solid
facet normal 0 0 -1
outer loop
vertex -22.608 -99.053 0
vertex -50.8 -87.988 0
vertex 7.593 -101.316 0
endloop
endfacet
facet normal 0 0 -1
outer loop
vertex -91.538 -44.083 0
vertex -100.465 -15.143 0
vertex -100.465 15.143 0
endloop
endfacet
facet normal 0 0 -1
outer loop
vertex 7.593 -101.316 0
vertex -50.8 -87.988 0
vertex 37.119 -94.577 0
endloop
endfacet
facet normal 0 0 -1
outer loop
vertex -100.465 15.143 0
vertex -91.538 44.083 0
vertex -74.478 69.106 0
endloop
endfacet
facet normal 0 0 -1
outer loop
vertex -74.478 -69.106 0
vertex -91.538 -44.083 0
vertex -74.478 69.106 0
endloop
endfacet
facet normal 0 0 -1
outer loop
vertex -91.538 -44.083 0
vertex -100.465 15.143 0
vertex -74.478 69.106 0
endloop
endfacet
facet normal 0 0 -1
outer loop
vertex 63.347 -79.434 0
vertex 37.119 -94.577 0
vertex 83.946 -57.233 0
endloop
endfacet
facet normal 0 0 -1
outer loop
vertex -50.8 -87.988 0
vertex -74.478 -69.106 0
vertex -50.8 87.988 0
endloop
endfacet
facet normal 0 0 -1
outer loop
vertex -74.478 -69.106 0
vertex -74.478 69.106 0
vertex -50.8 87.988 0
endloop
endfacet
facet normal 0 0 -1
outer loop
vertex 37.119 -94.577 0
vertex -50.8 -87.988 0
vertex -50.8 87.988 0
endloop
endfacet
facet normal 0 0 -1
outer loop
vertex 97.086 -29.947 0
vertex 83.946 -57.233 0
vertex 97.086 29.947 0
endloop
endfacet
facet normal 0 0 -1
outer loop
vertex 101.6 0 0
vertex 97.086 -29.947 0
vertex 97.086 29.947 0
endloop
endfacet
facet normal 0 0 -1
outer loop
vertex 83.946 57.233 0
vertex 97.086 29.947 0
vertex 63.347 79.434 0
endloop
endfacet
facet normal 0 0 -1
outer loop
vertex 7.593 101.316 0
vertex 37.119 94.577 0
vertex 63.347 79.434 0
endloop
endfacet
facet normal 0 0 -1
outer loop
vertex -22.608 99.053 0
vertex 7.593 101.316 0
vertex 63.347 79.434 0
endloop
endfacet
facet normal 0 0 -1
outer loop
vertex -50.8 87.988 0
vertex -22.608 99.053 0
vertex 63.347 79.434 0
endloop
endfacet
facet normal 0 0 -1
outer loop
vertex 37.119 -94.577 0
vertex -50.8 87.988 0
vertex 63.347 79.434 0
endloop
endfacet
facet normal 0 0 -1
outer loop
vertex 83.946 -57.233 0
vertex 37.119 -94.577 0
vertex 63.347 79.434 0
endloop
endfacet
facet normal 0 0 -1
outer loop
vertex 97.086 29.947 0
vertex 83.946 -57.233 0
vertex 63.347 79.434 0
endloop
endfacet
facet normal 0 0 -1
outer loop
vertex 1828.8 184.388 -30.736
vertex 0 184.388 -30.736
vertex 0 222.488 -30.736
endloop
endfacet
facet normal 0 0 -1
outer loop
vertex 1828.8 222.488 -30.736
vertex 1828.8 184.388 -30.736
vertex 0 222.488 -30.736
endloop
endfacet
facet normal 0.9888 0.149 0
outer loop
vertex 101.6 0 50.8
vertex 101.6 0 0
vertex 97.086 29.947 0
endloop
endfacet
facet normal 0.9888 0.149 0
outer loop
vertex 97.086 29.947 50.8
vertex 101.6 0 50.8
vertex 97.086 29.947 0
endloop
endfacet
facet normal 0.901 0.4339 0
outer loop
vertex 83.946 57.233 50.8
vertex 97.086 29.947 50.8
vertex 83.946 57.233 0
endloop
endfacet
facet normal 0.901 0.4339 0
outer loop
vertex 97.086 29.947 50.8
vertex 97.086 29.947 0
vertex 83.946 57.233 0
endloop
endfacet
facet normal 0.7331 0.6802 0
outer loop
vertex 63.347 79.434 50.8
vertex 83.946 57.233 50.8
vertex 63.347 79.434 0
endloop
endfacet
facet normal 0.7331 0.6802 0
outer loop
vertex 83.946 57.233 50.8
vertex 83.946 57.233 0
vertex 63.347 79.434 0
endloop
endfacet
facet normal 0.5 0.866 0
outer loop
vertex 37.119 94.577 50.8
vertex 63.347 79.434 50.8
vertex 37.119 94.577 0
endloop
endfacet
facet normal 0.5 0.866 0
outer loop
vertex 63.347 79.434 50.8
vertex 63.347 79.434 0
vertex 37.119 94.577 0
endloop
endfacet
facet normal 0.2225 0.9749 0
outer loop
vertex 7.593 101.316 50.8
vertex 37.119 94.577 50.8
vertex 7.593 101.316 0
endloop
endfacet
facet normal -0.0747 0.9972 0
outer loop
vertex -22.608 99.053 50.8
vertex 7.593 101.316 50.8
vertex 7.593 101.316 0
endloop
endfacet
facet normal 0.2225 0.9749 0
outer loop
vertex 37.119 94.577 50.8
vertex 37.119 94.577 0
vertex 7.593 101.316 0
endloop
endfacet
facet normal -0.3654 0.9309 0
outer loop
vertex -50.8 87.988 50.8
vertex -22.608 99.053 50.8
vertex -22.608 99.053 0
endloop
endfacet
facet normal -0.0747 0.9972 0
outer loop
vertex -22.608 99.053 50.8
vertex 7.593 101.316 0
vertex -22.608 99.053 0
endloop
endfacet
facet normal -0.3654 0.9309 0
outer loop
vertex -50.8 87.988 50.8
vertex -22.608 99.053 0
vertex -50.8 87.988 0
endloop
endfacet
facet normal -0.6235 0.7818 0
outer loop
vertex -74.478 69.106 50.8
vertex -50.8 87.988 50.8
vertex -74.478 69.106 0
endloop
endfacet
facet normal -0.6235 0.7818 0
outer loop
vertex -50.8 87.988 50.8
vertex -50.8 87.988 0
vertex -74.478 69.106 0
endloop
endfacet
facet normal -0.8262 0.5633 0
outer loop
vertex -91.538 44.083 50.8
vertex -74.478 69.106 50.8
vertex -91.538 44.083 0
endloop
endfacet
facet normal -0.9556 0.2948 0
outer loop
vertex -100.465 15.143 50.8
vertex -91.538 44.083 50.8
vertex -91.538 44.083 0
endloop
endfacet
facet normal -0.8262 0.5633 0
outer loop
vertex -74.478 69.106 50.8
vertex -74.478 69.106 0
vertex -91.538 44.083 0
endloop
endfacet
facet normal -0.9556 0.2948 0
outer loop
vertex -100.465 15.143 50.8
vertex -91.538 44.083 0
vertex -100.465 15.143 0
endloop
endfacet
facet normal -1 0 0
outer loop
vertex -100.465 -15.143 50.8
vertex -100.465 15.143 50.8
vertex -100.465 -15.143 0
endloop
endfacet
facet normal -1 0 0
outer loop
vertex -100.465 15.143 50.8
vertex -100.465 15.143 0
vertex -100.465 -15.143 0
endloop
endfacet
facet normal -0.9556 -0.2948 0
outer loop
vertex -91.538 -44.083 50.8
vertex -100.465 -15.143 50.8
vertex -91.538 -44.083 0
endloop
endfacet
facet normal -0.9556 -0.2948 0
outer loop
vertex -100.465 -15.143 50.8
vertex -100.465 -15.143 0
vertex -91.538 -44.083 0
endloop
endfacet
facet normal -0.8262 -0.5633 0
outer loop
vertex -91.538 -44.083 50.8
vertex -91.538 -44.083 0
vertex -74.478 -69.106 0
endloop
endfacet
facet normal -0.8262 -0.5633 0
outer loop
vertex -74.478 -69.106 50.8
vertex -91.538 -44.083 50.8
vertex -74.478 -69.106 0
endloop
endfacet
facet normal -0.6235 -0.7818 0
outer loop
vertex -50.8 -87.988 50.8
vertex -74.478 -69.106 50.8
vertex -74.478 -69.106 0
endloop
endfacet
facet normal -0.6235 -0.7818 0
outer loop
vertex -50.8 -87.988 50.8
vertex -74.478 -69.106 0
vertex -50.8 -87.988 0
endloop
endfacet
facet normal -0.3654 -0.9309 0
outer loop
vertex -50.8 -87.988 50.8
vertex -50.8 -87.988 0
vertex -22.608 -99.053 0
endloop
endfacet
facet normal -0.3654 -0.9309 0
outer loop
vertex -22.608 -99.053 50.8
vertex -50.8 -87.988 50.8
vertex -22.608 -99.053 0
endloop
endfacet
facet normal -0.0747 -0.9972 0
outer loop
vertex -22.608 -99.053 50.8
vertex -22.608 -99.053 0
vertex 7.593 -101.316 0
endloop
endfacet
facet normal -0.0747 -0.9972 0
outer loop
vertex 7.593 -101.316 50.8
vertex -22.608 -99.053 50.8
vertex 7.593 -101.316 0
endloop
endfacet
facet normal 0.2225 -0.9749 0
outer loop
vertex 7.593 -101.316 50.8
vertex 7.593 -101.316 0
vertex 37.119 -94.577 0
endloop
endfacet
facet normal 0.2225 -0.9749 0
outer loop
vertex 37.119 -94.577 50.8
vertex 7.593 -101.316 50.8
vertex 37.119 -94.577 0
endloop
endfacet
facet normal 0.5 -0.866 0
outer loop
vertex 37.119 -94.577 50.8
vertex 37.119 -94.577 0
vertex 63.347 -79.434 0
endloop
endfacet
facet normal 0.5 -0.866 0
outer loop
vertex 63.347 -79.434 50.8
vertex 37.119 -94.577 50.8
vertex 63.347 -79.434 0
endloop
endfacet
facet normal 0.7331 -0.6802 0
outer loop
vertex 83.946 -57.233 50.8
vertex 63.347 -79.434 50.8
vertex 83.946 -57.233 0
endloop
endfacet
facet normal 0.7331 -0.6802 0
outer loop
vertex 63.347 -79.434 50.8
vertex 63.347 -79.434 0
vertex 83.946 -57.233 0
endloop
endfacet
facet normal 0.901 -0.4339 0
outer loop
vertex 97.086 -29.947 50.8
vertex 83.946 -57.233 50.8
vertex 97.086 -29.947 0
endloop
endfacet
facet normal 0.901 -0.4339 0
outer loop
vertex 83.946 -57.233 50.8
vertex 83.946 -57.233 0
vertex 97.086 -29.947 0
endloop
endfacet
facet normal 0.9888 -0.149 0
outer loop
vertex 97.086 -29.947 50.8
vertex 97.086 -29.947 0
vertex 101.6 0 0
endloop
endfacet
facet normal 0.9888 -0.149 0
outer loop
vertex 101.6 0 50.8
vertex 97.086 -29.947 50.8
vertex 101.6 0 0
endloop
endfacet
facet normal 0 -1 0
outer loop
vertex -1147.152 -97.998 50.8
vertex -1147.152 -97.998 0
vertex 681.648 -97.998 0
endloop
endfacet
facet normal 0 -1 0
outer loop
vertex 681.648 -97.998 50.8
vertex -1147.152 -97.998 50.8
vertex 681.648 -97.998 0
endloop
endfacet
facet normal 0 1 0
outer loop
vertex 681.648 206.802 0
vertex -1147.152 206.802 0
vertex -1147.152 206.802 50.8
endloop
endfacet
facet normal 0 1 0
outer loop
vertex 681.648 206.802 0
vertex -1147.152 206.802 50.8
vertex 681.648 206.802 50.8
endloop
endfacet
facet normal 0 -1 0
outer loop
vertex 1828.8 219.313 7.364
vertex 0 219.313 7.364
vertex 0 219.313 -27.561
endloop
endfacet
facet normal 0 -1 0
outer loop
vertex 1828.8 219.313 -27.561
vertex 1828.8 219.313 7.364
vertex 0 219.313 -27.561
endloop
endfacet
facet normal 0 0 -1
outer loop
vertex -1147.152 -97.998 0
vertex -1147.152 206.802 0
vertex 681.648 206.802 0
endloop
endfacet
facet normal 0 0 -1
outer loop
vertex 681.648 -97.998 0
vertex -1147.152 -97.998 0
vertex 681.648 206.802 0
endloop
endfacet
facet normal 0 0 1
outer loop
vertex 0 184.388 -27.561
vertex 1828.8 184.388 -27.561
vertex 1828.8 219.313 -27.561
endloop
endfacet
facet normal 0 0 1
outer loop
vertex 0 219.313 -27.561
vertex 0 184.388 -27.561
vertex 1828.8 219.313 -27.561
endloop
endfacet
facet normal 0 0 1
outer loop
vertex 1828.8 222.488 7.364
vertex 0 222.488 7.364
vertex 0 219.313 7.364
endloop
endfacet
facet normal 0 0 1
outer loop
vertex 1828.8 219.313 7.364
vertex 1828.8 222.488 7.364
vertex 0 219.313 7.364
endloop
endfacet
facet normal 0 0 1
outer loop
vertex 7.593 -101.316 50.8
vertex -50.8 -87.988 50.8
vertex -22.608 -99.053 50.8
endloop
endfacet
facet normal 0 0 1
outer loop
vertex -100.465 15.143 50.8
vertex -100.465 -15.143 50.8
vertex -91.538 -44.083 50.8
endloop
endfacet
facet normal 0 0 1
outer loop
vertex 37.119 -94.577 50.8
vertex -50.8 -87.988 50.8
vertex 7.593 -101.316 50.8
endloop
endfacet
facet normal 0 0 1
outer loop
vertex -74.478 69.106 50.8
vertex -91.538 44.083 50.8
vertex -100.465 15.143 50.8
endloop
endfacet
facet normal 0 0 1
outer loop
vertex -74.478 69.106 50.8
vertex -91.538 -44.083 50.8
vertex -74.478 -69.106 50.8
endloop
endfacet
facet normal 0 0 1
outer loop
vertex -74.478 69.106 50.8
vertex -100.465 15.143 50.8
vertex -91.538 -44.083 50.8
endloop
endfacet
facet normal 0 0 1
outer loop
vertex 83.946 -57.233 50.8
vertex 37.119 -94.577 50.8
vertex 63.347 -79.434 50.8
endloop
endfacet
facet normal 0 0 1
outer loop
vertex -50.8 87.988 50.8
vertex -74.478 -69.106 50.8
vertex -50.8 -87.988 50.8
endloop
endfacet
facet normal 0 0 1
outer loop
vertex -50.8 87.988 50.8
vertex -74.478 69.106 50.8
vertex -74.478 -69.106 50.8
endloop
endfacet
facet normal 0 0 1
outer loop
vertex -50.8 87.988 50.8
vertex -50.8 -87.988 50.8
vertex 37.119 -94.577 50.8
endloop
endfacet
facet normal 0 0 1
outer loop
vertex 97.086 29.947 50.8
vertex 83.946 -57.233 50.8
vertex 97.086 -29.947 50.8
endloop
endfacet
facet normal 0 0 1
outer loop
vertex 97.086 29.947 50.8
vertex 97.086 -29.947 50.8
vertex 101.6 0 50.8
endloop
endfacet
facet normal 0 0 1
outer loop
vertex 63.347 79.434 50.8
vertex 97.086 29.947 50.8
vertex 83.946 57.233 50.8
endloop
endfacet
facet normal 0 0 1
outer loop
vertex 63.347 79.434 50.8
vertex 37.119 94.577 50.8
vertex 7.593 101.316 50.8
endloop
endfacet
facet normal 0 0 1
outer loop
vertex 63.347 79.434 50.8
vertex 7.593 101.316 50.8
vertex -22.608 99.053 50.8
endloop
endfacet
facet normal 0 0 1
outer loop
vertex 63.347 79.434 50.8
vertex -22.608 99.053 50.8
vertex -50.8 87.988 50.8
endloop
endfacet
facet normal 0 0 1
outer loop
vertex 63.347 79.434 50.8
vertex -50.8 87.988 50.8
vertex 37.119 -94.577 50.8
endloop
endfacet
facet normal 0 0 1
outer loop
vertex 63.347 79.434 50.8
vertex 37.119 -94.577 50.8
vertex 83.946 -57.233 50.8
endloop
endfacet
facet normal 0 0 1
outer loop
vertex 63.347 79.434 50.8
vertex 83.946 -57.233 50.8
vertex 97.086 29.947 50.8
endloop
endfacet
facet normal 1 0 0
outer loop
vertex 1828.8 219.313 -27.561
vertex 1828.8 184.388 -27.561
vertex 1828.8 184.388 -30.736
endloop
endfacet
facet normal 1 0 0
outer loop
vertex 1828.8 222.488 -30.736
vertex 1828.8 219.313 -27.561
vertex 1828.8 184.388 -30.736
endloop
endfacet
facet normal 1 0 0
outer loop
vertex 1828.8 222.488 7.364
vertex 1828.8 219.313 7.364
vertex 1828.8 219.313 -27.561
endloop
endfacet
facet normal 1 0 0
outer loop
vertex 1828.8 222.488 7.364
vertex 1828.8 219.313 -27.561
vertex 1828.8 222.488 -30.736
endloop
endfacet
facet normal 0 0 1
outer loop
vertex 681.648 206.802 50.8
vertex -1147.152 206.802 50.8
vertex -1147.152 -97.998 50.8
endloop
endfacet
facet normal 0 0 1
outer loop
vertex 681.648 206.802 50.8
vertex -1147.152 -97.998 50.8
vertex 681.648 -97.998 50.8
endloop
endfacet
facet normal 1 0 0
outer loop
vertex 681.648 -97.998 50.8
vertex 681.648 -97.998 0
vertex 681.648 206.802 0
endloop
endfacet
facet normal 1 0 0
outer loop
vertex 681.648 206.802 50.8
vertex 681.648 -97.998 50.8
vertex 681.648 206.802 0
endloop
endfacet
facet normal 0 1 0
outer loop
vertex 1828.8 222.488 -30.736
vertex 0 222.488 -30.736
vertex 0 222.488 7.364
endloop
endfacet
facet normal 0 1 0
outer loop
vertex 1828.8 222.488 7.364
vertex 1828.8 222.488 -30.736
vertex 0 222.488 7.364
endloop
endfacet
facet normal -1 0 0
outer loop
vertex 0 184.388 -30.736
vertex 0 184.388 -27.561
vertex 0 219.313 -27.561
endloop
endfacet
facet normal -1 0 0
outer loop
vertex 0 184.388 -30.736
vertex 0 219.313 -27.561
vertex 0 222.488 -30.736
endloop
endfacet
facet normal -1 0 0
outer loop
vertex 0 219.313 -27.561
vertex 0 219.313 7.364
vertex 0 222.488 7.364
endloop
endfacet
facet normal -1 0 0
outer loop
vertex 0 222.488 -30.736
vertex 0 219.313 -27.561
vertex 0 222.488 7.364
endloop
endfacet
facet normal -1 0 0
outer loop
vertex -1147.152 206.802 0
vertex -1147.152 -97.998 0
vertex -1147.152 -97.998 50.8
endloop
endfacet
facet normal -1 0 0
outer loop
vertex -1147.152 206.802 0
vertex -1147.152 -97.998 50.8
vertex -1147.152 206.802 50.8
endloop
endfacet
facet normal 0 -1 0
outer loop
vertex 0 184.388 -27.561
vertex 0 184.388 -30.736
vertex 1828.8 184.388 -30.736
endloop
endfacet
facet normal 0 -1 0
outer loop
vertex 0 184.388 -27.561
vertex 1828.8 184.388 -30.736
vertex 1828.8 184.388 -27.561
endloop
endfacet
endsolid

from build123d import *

# Parameters (mm, degrees)
F0_R     = 101.6
F1_DEPTH = 50.8
F2_W     = 1828.8
F2_H     = 304.8
F3_DEPTH = 50.8
F4_W     = 34.925
F4_H     = 3.175
F5_DEPTH = 1828.8


with BuildPart() as f1:
    # F0 (on Top) → F1 (new body)
    with BuildSketch(Plane.XY):
        Circle(F0_R)
    extrude(amount=F1_DEPTH)


with BuildPart() as f3:
    # F2 (on Top) → F3 (new body)
    with BuildSketch(Plane.XY):
        with Locations((-232.752066, 54.402089)):
            Rectangle(F2_W, F2_H)
    extrude(amount=F3_DEPTH)


with BuildPart() as f5:
    # F4 (on Right) → F5 (new body)
    with BuildSketch(Plane.YZ):
        Polygon((222.487578, -30.73646), (222.487578, 7.36354), (219.312578, 7.36354), (219.312578, -27.56146), (219.312578, -30.73646), align=None)
        with Locations((201.850078, -29.14896)):
            Rectangle(F4_W, F4_H)
    extrude(amount=F5_DEPTH)


solid = Compound([f1.part, f3.part, f5.part])
